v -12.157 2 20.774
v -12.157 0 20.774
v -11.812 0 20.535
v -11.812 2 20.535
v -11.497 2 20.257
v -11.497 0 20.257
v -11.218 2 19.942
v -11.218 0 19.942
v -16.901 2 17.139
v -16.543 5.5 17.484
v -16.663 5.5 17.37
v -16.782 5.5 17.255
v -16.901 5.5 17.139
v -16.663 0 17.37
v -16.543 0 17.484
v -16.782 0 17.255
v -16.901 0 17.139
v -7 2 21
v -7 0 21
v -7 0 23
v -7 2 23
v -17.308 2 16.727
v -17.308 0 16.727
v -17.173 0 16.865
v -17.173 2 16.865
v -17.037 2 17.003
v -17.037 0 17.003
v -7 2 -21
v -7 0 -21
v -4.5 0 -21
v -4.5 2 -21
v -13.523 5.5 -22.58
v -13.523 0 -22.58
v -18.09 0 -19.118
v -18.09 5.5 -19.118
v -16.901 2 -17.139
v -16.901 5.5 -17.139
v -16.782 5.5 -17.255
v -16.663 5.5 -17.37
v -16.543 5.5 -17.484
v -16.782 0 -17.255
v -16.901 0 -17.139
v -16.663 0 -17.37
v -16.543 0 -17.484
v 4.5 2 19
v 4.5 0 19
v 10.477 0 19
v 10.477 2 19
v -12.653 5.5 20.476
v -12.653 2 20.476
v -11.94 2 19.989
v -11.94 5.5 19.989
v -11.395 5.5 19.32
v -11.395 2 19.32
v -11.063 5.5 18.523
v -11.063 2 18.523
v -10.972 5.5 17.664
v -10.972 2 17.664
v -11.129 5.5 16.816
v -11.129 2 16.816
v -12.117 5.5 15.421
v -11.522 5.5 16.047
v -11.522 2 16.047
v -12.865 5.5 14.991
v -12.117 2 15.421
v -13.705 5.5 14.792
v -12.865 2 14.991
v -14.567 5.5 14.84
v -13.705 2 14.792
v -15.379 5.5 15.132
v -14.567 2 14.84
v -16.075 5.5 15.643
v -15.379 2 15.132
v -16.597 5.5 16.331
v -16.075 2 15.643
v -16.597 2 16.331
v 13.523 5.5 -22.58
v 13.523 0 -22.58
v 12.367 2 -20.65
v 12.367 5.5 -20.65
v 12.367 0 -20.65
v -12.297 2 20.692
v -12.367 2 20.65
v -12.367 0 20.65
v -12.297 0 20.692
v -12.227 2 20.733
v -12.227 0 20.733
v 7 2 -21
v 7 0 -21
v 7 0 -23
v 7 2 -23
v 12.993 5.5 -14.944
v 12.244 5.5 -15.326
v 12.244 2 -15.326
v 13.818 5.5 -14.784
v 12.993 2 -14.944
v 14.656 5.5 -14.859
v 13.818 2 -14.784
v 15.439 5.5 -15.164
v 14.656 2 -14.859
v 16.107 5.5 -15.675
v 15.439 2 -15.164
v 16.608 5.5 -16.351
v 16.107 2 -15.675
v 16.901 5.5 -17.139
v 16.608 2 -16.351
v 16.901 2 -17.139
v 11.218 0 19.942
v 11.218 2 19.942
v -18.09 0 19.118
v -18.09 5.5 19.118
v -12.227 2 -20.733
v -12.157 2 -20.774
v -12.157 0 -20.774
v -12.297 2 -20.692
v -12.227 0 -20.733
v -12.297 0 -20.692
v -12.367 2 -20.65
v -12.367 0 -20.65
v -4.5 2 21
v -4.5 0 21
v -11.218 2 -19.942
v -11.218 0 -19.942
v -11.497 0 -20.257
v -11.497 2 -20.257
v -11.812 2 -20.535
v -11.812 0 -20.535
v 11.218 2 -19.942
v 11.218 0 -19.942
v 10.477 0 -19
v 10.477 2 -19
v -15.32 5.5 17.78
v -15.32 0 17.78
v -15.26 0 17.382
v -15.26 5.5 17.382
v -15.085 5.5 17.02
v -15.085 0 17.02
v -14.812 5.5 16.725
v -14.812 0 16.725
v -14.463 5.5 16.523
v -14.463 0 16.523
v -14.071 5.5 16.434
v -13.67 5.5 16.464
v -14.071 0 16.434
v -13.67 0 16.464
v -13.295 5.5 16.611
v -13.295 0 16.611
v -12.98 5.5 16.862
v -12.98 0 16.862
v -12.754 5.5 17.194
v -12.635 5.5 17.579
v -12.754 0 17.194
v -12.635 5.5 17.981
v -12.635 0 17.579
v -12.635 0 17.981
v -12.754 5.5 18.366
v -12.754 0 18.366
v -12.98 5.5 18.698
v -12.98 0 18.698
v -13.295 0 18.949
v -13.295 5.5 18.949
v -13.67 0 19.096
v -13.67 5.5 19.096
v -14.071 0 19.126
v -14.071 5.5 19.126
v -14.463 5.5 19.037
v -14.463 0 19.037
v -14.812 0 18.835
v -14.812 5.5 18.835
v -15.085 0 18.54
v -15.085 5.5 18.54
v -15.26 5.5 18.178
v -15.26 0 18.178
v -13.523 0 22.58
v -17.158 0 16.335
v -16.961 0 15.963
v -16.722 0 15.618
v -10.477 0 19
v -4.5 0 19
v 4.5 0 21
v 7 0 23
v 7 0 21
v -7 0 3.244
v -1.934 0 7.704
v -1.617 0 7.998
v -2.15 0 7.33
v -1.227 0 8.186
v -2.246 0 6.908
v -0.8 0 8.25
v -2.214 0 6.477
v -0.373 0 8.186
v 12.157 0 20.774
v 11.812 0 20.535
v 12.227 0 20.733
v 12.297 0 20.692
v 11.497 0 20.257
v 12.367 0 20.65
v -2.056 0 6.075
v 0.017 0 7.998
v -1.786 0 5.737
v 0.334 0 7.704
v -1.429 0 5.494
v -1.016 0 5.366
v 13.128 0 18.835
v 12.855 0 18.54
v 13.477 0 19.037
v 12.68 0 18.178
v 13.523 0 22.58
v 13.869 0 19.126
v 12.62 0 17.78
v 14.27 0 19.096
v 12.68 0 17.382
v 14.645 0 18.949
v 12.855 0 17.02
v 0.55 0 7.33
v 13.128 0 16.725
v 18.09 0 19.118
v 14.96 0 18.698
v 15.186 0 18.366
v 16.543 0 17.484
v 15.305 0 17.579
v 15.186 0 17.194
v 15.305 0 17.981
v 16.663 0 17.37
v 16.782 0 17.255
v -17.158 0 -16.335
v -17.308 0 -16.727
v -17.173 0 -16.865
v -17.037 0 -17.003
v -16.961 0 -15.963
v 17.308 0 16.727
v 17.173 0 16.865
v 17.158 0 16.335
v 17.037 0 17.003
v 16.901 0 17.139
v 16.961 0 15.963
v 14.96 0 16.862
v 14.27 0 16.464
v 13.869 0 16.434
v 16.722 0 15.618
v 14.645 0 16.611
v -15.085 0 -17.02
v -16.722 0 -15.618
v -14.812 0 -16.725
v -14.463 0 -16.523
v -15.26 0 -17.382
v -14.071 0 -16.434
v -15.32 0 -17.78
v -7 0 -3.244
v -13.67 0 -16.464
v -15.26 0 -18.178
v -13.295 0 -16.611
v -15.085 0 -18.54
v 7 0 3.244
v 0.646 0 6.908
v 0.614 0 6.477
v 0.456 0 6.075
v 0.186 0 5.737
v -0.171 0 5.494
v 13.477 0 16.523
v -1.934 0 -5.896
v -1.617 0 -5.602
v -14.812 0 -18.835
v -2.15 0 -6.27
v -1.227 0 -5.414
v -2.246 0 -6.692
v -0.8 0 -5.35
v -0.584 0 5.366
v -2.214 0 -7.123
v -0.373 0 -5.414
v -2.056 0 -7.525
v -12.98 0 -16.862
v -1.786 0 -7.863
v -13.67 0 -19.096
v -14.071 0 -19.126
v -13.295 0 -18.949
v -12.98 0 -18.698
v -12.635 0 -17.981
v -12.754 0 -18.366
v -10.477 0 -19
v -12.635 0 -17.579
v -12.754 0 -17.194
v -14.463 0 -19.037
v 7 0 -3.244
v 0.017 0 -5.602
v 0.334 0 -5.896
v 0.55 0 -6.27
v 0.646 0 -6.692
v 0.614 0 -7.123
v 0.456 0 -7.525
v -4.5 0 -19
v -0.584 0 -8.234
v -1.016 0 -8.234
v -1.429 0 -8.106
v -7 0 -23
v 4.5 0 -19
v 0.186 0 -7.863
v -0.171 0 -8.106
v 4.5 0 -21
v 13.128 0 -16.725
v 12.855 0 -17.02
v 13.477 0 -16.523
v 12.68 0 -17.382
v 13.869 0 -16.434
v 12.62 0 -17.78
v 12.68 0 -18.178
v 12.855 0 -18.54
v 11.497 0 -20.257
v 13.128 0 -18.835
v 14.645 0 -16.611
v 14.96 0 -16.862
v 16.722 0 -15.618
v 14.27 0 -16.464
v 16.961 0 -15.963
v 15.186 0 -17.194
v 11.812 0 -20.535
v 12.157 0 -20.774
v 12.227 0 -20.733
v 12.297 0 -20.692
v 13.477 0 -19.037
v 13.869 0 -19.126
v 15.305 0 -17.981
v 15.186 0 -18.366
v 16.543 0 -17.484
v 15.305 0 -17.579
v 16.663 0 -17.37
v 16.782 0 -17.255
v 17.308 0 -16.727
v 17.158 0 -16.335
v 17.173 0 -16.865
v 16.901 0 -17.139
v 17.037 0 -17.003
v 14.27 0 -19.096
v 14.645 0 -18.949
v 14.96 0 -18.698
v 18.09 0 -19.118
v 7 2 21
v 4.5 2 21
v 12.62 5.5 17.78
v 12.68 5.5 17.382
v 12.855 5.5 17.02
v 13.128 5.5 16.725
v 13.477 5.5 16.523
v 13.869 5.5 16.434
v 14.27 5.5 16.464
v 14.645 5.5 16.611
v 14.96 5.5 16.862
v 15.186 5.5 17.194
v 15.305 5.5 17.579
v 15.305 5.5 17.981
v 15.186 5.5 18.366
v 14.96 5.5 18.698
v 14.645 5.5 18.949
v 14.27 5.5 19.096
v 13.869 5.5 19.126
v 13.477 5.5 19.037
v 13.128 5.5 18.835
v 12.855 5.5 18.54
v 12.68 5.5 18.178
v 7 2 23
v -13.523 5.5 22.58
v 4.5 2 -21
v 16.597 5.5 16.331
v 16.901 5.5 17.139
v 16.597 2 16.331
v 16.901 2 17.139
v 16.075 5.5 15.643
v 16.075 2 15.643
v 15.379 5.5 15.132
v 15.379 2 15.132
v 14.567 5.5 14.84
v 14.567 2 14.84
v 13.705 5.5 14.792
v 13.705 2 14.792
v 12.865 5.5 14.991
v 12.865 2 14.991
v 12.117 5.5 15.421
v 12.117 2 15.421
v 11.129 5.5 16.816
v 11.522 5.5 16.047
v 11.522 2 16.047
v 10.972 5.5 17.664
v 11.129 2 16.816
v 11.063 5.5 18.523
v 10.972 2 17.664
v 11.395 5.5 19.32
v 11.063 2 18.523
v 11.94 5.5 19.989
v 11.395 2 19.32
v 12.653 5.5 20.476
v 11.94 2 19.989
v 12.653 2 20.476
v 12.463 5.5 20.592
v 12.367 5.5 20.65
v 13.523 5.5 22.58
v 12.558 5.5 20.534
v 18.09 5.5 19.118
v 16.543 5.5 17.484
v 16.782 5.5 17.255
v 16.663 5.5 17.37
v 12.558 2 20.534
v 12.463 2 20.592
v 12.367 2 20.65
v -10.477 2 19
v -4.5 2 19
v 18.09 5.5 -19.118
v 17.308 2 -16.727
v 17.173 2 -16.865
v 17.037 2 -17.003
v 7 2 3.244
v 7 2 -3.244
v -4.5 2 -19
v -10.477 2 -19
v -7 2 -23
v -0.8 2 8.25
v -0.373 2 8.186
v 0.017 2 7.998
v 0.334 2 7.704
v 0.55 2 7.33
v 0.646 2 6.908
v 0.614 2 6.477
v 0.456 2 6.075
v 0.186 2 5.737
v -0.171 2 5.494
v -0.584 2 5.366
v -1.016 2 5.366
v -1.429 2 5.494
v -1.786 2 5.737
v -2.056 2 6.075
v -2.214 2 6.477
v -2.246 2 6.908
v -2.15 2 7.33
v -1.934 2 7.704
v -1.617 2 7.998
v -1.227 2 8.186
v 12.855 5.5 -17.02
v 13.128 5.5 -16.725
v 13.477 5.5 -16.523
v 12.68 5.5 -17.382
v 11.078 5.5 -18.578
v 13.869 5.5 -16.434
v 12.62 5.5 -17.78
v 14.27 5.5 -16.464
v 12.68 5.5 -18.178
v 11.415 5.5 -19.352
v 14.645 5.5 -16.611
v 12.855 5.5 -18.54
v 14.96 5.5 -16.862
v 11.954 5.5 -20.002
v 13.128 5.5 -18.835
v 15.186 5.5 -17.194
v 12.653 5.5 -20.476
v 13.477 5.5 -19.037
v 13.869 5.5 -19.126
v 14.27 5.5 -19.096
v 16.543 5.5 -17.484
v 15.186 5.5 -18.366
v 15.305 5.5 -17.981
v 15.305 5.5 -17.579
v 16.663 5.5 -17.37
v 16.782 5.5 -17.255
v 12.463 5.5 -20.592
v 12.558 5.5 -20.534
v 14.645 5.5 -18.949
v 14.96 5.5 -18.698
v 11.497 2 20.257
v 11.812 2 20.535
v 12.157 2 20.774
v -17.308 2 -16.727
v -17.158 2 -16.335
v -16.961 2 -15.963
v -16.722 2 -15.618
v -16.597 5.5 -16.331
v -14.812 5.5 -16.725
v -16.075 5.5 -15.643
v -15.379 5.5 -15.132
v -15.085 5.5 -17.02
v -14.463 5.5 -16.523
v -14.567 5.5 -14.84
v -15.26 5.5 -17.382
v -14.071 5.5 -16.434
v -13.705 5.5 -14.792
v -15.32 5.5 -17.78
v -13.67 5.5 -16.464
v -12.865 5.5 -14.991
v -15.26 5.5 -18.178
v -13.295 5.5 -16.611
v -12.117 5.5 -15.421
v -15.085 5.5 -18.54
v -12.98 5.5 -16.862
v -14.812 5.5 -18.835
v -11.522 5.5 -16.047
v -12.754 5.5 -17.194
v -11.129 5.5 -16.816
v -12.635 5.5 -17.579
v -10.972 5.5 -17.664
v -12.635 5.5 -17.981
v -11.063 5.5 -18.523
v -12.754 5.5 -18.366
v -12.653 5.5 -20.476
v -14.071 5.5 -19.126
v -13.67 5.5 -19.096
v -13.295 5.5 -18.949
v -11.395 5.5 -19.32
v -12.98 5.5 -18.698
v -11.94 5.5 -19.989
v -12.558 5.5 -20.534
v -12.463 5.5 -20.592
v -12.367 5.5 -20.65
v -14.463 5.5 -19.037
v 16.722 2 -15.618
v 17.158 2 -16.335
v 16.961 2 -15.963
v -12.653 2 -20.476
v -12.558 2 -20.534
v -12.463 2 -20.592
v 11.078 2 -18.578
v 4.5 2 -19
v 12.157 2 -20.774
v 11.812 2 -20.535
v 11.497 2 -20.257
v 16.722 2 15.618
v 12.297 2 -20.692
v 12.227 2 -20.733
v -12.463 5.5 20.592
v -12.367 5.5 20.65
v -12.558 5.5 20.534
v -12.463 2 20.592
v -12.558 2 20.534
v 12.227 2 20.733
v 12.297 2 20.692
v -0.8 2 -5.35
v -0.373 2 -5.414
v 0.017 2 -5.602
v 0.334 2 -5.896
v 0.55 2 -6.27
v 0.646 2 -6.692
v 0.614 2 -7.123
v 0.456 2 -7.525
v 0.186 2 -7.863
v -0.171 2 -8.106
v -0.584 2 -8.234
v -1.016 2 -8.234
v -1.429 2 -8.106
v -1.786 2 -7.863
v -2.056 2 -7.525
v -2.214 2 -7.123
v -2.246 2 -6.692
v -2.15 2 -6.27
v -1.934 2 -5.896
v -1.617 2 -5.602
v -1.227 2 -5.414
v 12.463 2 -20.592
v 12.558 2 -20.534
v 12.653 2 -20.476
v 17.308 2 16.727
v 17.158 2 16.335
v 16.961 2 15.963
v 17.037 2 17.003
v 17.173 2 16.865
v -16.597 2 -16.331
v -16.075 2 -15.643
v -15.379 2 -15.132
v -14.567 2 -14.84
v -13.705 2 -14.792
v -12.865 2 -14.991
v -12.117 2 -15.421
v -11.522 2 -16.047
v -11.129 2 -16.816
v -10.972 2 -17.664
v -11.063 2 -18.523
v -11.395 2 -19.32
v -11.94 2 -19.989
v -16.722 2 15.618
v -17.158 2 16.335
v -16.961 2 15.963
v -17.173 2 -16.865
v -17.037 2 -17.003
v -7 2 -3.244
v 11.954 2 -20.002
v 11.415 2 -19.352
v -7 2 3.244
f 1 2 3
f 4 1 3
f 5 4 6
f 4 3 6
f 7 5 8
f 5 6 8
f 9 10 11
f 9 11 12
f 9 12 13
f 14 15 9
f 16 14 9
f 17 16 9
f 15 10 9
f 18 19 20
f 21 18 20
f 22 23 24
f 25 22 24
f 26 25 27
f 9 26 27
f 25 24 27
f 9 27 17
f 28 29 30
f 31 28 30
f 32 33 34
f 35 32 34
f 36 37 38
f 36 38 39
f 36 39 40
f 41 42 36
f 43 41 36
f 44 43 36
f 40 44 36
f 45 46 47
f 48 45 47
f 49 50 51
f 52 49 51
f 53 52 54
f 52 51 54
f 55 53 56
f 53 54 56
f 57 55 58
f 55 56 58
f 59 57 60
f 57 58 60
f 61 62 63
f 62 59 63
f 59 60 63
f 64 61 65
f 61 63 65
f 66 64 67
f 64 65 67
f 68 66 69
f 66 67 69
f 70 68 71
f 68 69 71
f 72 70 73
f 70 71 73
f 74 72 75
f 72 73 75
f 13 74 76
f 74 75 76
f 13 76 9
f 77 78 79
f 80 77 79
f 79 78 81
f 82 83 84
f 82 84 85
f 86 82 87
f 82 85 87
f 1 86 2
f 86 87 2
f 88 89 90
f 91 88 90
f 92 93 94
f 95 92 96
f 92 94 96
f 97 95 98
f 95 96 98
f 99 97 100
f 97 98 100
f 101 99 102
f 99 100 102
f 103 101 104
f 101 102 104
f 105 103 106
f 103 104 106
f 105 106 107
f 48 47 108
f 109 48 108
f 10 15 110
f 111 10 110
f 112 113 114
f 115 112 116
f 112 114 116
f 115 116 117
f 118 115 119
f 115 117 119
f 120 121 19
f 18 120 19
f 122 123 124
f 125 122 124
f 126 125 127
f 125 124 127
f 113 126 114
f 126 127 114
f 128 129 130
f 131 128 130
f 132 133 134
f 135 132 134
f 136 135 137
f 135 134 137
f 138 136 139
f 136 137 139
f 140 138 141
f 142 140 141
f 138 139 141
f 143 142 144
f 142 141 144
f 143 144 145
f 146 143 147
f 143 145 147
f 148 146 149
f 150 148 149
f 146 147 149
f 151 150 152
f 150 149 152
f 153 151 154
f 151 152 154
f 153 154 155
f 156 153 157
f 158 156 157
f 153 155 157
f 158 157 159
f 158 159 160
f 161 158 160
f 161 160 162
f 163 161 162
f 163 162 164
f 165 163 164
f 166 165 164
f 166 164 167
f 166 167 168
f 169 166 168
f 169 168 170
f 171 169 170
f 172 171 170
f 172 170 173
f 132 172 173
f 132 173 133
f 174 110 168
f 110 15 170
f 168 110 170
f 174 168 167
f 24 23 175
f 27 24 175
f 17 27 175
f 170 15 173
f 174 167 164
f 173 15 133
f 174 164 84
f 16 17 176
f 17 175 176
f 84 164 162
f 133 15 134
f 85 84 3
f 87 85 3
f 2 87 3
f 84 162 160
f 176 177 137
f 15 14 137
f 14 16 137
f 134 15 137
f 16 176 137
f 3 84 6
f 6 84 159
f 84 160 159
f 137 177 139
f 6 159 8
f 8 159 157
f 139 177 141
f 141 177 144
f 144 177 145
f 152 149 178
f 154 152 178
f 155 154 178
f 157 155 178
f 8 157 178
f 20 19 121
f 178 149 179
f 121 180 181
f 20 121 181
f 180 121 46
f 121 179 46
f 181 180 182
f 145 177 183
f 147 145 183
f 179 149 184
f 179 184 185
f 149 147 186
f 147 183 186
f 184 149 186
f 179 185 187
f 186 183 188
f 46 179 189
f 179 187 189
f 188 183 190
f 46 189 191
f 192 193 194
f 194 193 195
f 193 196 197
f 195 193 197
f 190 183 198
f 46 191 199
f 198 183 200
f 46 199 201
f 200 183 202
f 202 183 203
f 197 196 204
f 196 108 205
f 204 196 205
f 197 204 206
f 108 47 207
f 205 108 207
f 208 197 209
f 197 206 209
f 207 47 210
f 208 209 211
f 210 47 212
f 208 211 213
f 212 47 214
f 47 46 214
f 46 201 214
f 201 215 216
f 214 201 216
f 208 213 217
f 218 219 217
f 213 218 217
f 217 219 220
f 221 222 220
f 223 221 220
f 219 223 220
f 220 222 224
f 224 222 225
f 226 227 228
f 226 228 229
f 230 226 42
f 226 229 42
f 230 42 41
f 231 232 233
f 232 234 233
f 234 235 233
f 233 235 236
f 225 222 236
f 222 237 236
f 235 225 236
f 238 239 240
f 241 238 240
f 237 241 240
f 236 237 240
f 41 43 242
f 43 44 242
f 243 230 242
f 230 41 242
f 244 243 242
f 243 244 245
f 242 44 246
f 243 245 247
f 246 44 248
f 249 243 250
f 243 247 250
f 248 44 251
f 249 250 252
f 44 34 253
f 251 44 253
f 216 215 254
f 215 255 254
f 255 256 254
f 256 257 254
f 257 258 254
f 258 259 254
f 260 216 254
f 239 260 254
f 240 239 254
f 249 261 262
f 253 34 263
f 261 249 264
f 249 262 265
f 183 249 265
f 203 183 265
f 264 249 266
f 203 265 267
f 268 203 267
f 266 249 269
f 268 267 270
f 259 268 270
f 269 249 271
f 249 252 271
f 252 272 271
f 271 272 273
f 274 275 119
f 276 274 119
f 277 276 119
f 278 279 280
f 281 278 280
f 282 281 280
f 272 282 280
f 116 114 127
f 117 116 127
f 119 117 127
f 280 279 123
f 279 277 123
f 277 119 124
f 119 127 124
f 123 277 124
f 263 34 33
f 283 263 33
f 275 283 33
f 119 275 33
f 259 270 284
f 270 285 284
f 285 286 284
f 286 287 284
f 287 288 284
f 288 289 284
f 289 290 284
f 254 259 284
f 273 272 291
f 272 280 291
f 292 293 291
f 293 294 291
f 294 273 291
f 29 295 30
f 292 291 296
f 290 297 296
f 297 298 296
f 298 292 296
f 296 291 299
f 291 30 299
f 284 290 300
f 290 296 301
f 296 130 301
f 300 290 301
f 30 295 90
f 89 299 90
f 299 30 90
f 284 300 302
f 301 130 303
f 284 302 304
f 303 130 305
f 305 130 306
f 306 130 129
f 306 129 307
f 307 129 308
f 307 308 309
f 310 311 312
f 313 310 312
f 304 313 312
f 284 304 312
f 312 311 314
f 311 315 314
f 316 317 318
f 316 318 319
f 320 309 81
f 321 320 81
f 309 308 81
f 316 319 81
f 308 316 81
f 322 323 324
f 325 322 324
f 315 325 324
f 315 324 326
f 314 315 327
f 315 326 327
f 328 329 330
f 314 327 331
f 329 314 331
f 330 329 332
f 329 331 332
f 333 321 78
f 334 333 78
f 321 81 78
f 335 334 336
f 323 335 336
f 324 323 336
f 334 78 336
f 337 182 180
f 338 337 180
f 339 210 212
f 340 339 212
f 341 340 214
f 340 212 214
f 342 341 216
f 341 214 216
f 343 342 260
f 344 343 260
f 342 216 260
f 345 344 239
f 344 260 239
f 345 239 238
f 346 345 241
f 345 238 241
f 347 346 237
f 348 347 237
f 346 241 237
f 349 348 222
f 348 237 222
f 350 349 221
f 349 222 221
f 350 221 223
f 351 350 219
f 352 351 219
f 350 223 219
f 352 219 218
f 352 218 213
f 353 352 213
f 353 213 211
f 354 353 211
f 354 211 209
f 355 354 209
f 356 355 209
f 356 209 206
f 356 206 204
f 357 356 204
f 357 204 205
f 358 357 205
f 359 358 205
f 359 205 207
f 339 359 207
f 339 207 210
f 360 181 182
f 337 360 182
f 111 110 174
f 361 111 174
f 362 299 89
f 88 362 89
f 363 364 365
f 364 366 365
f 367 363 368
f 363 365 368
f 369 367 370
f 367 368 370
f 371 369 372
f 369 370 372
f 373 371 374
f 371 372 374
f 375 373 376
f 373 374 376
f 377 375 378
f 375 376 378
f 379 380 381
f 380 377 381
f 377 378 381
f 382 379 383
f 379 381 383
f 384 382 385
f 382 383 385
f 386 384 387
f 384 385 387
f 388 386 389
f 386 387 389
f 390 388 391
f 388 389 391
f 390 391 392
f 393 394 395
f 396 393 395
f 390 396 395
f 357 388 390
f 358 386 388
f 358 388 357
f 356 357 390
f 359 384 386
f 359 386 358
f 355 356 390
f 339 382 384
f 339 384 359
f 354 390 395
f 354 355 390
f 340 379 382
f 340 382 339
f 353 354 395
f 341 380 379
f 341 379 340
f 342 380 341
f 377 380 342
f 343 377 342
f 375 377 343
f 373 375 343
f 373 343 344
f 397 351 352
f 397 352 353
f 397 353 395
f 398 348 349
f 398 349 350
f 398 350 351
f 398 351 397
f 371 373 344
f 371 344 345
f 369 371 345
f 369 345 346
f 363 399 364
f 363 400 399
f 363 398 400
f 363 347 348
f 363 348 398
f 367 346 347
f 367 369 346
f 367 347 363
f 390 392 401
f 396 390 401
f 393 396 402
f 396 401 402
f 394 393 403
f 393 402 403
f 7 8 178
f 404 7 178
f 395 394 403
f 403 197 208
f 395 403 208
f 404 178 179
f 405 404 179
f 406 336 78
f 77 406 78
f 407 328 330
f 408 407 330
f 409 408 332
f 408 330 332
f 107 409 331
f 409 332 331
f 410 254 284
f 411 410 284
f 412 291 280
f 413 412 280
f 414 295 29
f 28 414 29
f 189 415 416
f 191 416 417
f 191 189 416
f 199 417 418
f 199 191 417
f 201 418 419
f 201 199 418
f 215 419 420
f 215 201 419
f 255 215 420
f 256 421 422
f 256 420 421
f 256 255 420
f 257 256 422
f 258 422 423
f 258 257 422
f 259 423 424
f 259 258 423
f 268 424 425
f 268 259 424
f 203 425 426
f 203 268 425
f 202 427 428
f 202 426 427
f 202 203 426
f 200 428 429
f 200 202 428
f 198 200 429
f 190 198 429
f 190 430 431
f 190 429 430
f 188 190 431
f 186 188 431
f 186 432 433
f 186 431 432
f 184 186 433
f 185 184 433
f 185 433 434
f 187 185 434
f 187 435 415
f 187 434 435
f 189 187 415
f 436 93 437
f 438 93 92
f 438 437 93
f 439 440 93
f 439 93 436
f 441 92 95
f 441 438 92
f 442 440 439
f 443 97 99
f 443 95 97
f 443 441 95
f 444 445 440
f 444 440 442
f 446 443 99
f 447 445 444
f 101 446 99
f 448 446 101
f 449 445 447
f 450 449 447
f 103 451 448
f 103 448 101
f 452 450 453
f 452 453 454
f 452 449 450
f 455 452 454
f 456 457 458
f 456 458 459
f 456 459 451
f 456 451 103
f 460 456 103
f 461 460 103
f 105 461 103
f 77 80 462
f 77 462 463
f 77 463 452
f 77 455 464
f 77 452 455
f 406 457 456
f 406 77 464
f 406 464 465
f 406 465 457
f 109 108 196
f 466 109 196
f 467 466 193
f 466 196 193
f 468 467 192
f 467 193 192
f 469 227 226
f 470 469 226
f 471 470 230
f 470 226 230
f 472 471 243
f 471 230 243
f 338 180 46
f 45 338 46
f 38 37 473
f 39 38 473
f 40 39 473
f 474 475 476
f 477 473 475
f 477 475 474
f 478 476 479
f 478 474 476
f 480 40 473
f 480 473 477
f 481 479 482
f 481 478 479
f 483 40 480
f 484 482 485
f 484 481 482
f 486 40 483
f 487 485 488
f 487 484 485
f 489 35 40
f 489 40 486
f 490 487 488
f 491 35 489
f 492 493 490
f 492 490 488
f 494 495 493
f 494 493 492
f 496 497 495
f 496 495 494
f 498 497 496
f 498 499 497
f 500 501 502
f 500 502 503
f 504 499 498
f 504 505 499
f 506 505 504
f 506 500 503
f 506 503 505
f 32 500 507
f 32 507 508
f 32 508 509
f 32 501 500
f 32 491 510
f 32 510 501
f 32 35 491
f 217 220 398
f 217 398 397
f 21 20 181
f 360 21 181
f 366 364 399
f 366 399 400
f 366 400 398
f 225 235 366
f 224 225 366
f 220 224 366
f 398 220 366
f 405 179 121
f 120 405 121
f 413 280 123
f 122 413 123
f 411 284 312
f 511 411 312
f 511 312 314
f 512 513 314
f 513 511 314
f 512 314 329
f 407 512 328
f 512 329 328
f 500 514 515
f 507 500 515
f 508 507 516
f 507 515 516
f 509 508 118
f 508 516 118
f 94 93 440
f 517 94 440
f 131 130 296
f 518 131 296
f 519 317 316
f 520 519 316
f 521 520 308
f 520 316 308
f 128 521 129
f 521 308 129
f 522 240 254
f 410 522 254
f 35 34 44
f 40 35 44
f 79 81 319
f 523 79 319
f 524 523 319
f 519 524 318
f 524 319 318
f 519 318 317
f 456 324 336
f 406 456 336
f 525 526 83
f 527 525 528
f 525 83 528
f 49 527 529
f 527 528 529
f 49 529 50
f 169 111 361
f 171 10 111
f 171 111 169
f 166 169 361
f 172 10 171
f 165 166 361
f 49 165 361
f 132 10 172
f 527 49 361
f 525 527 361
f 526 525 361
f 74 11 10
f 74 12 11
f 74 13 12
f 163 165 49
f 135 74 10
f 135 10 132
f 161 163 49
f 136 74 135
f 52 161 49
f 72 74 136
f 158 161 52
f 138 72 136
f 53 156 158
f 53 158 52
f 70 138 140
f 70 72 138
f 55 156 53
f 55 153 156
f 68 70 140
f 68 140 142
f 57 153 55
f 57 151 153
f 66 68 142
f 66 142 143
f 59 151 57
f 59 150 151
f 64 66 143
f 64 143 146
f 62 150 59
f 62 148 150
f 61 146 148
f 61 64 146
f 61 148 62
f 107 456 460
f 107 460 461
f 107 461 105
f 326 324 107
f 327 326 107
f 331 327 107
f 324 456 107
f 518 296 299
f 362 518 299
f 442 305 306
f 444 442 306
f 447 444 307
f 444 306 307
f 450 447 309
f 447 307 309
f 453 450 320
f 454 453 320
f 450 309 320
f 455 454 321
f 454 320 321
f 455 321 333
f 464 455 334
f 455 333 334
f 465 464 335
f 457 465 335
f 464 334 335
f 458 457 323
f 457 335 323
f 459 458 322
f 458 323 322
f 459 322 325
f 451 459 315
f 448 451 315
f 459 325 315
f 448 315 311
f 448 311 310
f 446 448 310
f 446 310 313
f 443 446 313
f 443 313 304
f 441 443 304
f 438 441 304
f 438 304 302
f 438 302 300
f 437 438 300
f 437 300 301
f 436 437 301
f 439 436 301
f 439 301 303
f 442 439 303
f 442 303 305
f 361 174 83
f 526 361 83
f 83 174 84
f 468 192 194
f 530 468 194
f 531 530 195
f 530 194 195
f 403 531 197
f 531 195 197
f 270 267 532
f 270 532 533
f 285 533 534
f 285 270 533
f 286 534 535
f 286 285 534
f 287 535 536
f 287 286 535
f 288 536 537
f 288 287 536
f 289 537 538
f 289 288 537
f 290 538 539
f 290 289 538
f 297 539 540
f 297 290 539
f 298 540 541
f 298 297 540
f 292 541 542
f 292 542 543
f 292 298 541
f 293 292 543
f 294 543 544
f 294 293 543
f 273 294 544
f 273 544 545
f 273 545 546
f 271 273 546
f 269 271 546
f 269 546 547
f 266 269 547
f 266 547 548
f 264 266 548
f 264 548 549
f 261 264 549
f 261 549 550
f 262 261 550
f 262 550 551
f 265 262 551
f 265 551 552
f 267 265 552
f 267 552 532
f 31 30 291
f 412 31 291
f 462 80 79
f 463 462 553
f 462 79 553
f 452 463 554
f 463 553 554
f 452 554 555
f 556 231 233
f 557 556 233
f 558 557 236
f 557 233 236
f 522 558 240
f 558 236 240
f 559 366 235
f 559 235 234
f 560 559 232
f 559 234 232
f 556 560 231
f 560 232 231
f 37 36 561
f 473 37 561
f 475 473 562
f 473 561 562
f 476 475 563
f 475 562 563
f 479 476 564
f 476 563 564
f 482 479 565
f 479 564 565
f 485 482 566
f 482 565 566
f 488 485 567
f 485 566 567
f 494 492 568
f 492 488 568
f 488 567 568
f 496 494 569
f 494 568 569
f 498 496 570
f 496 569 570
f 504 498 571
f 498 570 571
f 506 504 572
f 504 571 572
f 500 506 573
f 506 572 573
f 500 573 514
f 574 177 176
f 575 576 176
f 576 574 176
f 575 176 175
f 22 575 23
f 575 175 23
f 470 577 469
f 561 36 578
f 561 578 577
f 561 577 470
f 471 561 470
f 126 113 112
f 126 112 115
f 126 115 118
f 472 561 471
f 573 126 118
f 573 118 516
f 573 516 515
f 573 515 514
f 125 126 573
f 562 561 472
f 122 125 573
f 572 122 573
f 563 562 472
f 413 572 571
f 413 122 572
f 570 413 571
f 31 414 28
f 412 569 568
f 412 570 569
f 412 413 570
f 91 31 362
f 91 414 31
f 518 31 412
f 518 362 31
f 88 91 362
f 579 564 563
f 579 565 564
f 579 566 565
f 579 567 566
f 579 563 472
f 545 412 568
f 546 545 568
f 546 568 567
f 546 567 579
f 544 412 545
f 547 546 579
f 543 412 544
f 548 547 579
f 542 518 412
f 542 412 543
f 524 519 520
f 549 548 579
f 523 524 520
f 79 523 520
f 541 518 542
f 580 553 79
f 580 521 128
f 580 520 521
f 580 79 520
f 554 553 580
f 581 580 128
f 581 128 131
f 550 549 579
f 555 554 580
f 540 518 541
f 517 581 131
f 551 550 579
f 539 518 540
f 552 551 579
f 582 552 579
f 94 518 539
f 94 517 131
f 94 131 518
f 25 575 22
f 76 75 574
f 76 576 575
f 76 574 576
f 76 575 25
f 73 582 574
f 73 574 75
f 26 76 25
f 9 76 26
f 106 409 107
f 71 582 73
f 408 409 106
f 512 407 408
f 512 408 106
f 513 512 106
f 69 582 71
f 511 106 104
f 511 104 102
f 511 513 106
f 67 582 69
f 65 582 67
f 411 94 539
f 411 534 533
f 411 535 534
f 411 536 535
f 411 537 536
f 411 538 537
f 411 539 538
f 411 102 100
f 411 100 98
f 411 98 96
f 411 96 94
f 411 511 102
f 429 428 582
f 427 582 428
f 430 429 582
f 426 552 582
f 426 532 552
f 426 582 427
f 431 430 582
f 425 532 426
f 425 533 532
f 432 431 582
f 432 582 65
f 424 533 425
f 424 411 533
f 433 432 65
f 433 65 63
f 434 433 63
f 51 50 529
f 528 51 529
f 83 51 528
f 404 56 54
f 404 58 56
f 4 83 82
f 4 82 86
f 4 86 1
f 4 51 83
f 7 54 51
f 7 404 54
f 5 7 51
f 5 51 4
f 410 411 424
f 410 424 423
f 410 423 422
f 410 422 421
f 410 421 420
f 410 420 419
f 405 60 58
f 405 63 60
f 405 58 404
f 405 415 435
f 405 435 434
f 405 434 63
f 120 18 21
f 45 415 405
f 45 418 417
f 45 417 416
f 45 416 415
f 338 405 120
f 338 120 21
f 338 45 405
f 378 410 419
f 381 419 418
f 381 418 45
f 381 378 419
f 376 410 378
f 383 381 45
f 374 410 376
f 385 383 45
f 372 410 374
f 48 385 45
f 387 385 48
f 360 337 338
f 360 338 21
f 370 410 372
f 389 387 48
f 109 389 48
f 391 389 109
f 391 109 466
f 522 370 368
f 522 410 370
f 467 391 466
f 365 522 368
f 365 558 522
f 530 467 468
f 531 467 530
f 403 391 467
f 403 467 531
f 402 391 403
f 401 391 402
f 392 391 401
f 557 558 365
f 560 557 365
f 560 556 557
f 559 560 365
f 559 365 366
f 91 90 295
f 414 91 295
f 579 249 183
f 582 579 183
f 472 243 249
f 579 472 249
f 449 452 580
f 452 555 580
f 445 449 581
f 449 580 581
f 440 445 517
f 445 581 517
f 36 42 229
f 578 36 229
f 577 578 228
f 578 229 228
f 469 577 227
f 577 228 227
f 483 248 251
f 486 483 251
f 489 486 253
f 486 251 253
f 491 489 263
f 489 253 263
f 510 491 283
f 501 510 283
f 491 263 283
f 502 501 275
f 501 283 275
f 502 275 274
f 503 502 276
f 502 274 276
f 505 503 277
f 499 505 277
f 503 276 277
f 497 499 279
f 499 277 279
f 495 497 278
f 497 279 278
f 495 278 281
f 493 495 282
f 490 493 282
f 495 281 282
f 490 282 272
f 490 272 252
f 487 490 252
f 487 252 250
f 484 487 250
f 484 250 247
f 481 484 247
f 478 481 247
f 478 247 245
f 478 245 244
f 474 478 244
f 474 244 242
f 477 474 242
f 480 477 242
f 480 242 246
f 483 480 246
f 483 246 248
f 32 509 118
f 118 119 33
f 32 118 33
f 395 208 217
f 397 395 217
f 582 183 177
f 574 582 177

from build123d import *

# Parameters (mm, degrees)
SKETCH1_R               = 24.07
BOSS_EXTRUDE1_DEPTH     = 2
BOSS_EXTRUDE2_DEPTH     = 5.5
BOSS_EXTRUDE5_REACH     = 36.482
SKETCH2_R               = 3
SKETCH1_5_R             = 34.31362745
CUT_EXTRUDE3_DEPTH      = 35.48158639
CUT_EXTRUDE3_DEPTH_BACK = 35.48158639
M2_5_CLEARANCE_HOLE1_D  = 2.7
CUT_EXTRUDE4_DEPTH      = 35.48158639
SKETCH10_R              = 1.45
CUT_EXTRUDE6_DEPTH      = 30.773984948
CUT_EXTRUDE7_DEPTH      = 3.5


with BuildPart() as part:
    # Sketch1 → Boss-Extrude1 (new body)
    with BuildSketch(Plane(origin=(0, 0, 0), x_dir=(1, 0, 0), z_dir=(0, 1, 0))):
        with Locations(Location((0, 0, 0), (0, 0, 270))):
            Circle(SKETCH1_R)
    extrude(amount=BOSS_EXTRUDE1_DEPTH)

    # Sketch1<3> → Boss-Extrude2 (add)
    with BuildSketch(Plane(origin=(0, 0, 0), x_dir=(1, 0, 0), z_dir=(0, 1, 0))):
        with BuildLine():
            ThreePointArc((12.366915807, 20.650043424), (14.541516735, 19.180959075), (16.543257949, 17.483864459))
            Line((16.543257949, 17.483864459), (18.089781085, 19.118318867))
            Line((18.089781085, 19.118318867), (13.523019488, 22.580483607))
            Line((13.523019488, 22.580483607), (12.366915807, 20.650043424))
        make_face()
        with BuildLine():
            ThreePointArc((16.543257949, -17.483864459), (14.541516735, -19.180959075), (12.366915807, -20.650043424))
            Line((12.366915807, -20.650043424), (13.523019488, -22.580483607))
            Line((13.523019488, -22.580483607), (18.089781085, -19.118318867))
            Line((18.089781085, -19.118318867), (16.543257949, -17.483864459))
        make_face()
        with BuildLine():
            ThreePointArc((-16.543257949, 17.483864459), (-14.541516735, 19.180959075), (-12.366915807, 20.650043424))
            Line((-12.366915807, 20.650043424), (-13.523019488, 22.580483607))
            Line((-13.523019488, 22.580483607), (-18.089781085, 19.118318867))
            Line((-18.089781085, 19.118318867), (-16.543257949, 17.483864459))
        make_face()
        with BuildLine():
            ThreePointArc((-12.366915807, -20.650043424), (-14.541516735, -19.180959075), (-16.543257949, -17.483864459))
            Line((-16.543257949, -17.483864459), (-18.089781085, -19.118318867))
            Line((-18.089781085, -19.118318867), (-13.523019488, -22.580483607))
            Line((-13.523019488, -22.580483607), (-12.366915807, -20.650043424))
        make_face()
    extrude(amount=BOSS_EXTRUDE2_DEPTH)

    # Boss-Extrude5: up to this face of the body (flat: up to its plane)
    boss_extrude5_end = Plane(part.part.faces().sort_by_distance((15.168468653, 5.5, 20.00793877))[0])
    # Sketch2 → Boss-Extrude5 (add, up to the picked face)
    with BuildSketch(Plane(origin=(0, 0, 0), x_dir=(1, 0, 0), z_dir=(0, 1, 0)), mode=Mode.PRIVATE) as boss_extrude5_sk1:
        with Locations((13.97, 17.78)):
            Circle(SKETCH2_R)
    boss_extrude5_tool1 = split(extrude(boss_extrude5_sk1.sketch, amount=BOSS_EXTRUDE5_REACH, mode=Mode.PRIVATE), bisect_by=boss_extrude5_end, keep=Keep.BOTH, mode=Mode.PRIVATE)
    # Sketch2 → Boss-Extrude5 (add, up to the picked face)
    with BuildSketch(Plane(origin=(0, 0, 0), x_dir=(1, 0, 0), z_dir=(0, 1, 0)), mode=Mode.PRIVATE) as boss_extrude5_sk2:
        with Locations((13.97, -17.78)):
            Circle(SKETCH2_R)
    boss_extrude5_tool2 = split(extrude(boss_extrude5_sk2.sketch, amount=BOSS_EXTRUDE5_REACH, mode=Mode.PRIVATE), bisect_by=boss_extrude5_end, keep=Keep.BOTH, mode=Mode.PRIVATE)
    # Sketch2 → Boss-Extrude5 (add, up to the picked face)
    with BuildSketch(Plane(origin=(0, 0, 0), x_dir=(1, 0, 0), z_dir=(0, 1, 0)), mode=Mode.PRIVATE) as boss_extrude5_sk3:
        with Locations((-13.97, -17.78)):
            Circle(SKETCH2_R)
    boss_extrude5_tool3 = split(extrude(boss_extrude5_sk3.sketch, amount=BOSS_EXTRUDE5_REACH, mode=Mode.PRIVATE), bisect_by=boss_extrude5_end, keep=Keep.BOTH, mode=Mode.PRIVATE)
    # Sketch2 → Boss-Extrude5 (add, up to the picked face)
    with BuildSketch(Plane(origin=(0, 0, 0), x_dir=(1, 0, 0), z_dir=(0, 1, 0)), mode=Mode.PRIVATE) as boss_extrude5_sk4:
        with Locations((-13.97, 17.78)):
            Circle(SKETCH2_R)
    boss_extrude5_tool4 = split(extrude(boss_extrude5_sk4.sketch, amount=BOSS_EXTRUDE5_REACH, mode=Mode.PRIVATE), bisect_by=boss_extrude5_end, keep=Keep.BOTH, mode=Mode.PRIVATE)
    add(boss_extrude5_tool1.solids().sort_by(Axis((13.97, 0, -17.78), (0, 1, 0)))[0])
    add(boss_extrude5_tool2.solids().sort_by(Axis((13.97, 0, 17.78), (0, 1, 0)))[0])
    add(boss_extrude5_tool3.solids().sort_by(Axis((-13.97, 0, 17.78), (0, 1, 0)))[0])
    add(boss_extrude5_tool4.solids().sort_by(Axis((-13.97, 0, -17.78), (0, 1, 0)))[0])

    # Sketch1<5> → Cut-Extrude3 (cut, two sides)
    with BuildSketch(Plane(origin=(0, 0, 0), x_dir=(1, 0, 0), z_dir=(0, 1, 0))) as cut_extrude3_sk:
        Circle(SKETCH1_5_R)
        with BuildLine():
            Line((18.089781085, 19.118318867), (16.543257949, 17.483864459))
            ThreePointArc((16.543257949, 17.483864459), (22.108382108, 9.517580605), (24.07, 0))
            ThreePointArc((24.07, 0), (22.108382108, -9.517580605), (16.543257949, -17.483864459))
            Line((16.543257949, -17.483864459), (18.089781085, -19.118318867))
            Line((18.089781085, -19.118318867), (13.523019488, -22.580483607))
            Line((13.523019488, -22.580483607), (12.366915807, -20.650043424))
            ThreePointArc((12.366915807, -20.650043424), (0, -24.07), (-12.366915807, -20.650043424))
            Line((-12.366915807, -20.650043424), (-13.523019488, -22.580483607))
            Line((-13.523019488, -22.580483607), (-18.089781085, -19.118318867))
            Line((-18.089781085, -19.118318867), (-16.543257949, -17.483864459))
            ThreePointArc((-16.543257949, -17.483864459), (-24.07, 0), (-16.543257949, 17.483864459))
            Line((-16.543257949, 17.483864459), (-18.089781085, 19.118318867))
            Line((-18.089781085, 19.118318867), (-13.523019488, 22.580483607))
            Line((-13.523019488, 22.580483607), (-12.366915807, 20.650043424))
            ThreePointArc((-12.366915807, 20.650043424), (0, 24.07), (12.366915807, 20.650043424))
            Line((12.366915807, 20.650043424), (13.523019488, 22.580483607))
            Line((13.523019488, 22.580483607), (18.089781085, 19.118318867))
        make_face(mode=Mode.SUBTRACT)
    extrude(amount=CUT_EXTRUDE3_DEPTH, mode=Mode.SUBTRACT)
    extrude(cut_extrude3_sk.sketch, amount=-CUT_EXTRUDE3_DEPTH_BACK, mode=Mode.SUBTRACT)

    # M2.5 Clearance Hole1 (through all)
    with Locations(Plane(origin=(0, 5.5, 0), x_dir=(1, 0, 0), z_dir=(0, 1, 0))):
        with Locations((-13.97, 17.78), (13.97, 17.78), (13.97, -17.78), (-13.97, -17.78)):
            Hole(M2_5_CLEARANCE_HOLE1_D / 2)

    # Sketch8 → Cut-Extrude4 (cut, through all)
    with BuildSketch(Plane.XZ):
        with BuildLine():
            ThreePointArc((-12.157407277, 20.77407876), (-11.650071144, 20.400673597), (-11.217885814, 19.942375432))
            Line((-11.217885814, 19.942375432), (-10.477447975, 19))
            Line((-10.477447975, 19), (-4.5, 19))
            Line((-4.5, 19), (-4.5, 21))
            Line((-4.5, 21), (-7, 21))
            Line((-7, 21), (-7, 23))
            Line((-7, 23), (7, 23))
            Line((7, 23), (7, 21))
            Line((7, 21), (4.5, 21))
            Line((4.5, 21), (4.5, 19))
            Line((4.5, 19), (10.477447975, 19))
            Line((10.477447975, 19), (11.217885814, 19.942375432))
            ThreePointArc((11.217885814, 19.942375432), (11.650071144, 20.400673597), (12.157407277, 20.77407876))
            ThreePointArc((12.157407277, 20.77407876), (0, 24.07), (-12.157407277, 20.77407876))
        make_face()
        with BuildLine():
            Line((7, 3.244024695), (7, -3.244024695))
            Line((7, -3.244024695), (16.722114186, -15.617624568))
            ThreePointArc((16.722114186, -15.617624568), (17.065148682, -16.145969817), (17.307920228, -16.727247155))
            ThreePointArc((17.307920228, -16.727247155), (24.07, 0), (17.307920228, 16.727247155))
            ThreePointArc((17.307920228, 16.727247155), (17.065148682, 16.145969817), (16.722114186, 15.617624568))
            Line((16.722114186, 15.617624568), (7, 3.244024695))
        make_face()
        with BuildLine():
            Line((-7, -3.244024695), (-7, 3.244024695))
            Line((-7, 3.244024695), (-16.722114186, 15.617624568))
            ThreePointArc((-16.722114186, 15.617624568), (-17.065148682, 16.145969817), (-17.307920228, 16.727247155))
            ThreePointArc((-17.307920228, 16.727247155), (-24.07, 0), (-17.307920228, -16.727247155))
            ThreePointArc((-17.307920228, -16.727247155), (-17.065148682, -16.145969817), (-16.722114186, -15.617624568))
            Line((-16.722114186, -15.617624568), (-7, -3.244024695))
        make_face()
        with BuildLine():
            Line((11.217885814, -19.942375432), (10.477447975, -19))
            Line((10.477447975, -19), (4.5, -19))
            Line((4.5, -19), (4.5, -21))
            Line((4.5, -21), (7, -21))
            Line((7, -21), (7, -23))
            Line((7, -23), (-7, -23))
            Line((-7, -23), (-7, -21))
            Line((-7, -21), (-4.5, -21))
            Line((-4.5, -21), (-4.5, -19))
            Line((-4.5, -19), (-10.477447975, -19))
            Line((-10.477447975, -19), (-11.217885814, -19.942375432))
            ThreePointArc((-11.217885814, -19.942375432), (-11.650071144, -20.400673597), (-12.157407277, -20.77407876))
            ThreePointArc((-12.157407277, -20.77407876), (0, -24.07), (12.157407277, -20.77407876))
            ThreePointArc((12.157407277, -20.77407876), (11.650071144, -20.400673597), (11.217885814, -19.942375432))
        make_face()
    extrude(amount=-CUT_EXTRUDE4_DEPTH, mode=Mode.SUBTRACT)

    # Sketch10 → Cut-Extrude6 (cut, through all)
    with BuildSketch(Plane(origin=(0, 0, 0), x_dir=(1, 0, 0), z_dir=(0, 1, 0))):
        with Locations(Location((-0.8, -6.8, 0), (0, 0, 270))):
            Circle(SKETCH10_R)
        with Locations(Location((-0.8, 6.8, 0), (0, 0, 270))):
            Circle(SKETCH10_R)
    extrude(amount=CUT_EXTRUDE6_DEPTH, mode=Mode.SUBTRACT)

    # Sketch11 → Cut-Extrude7 (cut)
    with BuildSketch(Plane(origin=(0, 5.5, 0), x_dir=(1, 0, 0), z_dir=(0, 1, 0))):
        Polygon((0, 0), (17.739781085, 0), (10.209781085, 21), (0, 21), align=None)
    extrude(amount=-CUT_EXTRUDE7_DEPTH, mode=Mode.SUBTRACT)


solid = part.part
